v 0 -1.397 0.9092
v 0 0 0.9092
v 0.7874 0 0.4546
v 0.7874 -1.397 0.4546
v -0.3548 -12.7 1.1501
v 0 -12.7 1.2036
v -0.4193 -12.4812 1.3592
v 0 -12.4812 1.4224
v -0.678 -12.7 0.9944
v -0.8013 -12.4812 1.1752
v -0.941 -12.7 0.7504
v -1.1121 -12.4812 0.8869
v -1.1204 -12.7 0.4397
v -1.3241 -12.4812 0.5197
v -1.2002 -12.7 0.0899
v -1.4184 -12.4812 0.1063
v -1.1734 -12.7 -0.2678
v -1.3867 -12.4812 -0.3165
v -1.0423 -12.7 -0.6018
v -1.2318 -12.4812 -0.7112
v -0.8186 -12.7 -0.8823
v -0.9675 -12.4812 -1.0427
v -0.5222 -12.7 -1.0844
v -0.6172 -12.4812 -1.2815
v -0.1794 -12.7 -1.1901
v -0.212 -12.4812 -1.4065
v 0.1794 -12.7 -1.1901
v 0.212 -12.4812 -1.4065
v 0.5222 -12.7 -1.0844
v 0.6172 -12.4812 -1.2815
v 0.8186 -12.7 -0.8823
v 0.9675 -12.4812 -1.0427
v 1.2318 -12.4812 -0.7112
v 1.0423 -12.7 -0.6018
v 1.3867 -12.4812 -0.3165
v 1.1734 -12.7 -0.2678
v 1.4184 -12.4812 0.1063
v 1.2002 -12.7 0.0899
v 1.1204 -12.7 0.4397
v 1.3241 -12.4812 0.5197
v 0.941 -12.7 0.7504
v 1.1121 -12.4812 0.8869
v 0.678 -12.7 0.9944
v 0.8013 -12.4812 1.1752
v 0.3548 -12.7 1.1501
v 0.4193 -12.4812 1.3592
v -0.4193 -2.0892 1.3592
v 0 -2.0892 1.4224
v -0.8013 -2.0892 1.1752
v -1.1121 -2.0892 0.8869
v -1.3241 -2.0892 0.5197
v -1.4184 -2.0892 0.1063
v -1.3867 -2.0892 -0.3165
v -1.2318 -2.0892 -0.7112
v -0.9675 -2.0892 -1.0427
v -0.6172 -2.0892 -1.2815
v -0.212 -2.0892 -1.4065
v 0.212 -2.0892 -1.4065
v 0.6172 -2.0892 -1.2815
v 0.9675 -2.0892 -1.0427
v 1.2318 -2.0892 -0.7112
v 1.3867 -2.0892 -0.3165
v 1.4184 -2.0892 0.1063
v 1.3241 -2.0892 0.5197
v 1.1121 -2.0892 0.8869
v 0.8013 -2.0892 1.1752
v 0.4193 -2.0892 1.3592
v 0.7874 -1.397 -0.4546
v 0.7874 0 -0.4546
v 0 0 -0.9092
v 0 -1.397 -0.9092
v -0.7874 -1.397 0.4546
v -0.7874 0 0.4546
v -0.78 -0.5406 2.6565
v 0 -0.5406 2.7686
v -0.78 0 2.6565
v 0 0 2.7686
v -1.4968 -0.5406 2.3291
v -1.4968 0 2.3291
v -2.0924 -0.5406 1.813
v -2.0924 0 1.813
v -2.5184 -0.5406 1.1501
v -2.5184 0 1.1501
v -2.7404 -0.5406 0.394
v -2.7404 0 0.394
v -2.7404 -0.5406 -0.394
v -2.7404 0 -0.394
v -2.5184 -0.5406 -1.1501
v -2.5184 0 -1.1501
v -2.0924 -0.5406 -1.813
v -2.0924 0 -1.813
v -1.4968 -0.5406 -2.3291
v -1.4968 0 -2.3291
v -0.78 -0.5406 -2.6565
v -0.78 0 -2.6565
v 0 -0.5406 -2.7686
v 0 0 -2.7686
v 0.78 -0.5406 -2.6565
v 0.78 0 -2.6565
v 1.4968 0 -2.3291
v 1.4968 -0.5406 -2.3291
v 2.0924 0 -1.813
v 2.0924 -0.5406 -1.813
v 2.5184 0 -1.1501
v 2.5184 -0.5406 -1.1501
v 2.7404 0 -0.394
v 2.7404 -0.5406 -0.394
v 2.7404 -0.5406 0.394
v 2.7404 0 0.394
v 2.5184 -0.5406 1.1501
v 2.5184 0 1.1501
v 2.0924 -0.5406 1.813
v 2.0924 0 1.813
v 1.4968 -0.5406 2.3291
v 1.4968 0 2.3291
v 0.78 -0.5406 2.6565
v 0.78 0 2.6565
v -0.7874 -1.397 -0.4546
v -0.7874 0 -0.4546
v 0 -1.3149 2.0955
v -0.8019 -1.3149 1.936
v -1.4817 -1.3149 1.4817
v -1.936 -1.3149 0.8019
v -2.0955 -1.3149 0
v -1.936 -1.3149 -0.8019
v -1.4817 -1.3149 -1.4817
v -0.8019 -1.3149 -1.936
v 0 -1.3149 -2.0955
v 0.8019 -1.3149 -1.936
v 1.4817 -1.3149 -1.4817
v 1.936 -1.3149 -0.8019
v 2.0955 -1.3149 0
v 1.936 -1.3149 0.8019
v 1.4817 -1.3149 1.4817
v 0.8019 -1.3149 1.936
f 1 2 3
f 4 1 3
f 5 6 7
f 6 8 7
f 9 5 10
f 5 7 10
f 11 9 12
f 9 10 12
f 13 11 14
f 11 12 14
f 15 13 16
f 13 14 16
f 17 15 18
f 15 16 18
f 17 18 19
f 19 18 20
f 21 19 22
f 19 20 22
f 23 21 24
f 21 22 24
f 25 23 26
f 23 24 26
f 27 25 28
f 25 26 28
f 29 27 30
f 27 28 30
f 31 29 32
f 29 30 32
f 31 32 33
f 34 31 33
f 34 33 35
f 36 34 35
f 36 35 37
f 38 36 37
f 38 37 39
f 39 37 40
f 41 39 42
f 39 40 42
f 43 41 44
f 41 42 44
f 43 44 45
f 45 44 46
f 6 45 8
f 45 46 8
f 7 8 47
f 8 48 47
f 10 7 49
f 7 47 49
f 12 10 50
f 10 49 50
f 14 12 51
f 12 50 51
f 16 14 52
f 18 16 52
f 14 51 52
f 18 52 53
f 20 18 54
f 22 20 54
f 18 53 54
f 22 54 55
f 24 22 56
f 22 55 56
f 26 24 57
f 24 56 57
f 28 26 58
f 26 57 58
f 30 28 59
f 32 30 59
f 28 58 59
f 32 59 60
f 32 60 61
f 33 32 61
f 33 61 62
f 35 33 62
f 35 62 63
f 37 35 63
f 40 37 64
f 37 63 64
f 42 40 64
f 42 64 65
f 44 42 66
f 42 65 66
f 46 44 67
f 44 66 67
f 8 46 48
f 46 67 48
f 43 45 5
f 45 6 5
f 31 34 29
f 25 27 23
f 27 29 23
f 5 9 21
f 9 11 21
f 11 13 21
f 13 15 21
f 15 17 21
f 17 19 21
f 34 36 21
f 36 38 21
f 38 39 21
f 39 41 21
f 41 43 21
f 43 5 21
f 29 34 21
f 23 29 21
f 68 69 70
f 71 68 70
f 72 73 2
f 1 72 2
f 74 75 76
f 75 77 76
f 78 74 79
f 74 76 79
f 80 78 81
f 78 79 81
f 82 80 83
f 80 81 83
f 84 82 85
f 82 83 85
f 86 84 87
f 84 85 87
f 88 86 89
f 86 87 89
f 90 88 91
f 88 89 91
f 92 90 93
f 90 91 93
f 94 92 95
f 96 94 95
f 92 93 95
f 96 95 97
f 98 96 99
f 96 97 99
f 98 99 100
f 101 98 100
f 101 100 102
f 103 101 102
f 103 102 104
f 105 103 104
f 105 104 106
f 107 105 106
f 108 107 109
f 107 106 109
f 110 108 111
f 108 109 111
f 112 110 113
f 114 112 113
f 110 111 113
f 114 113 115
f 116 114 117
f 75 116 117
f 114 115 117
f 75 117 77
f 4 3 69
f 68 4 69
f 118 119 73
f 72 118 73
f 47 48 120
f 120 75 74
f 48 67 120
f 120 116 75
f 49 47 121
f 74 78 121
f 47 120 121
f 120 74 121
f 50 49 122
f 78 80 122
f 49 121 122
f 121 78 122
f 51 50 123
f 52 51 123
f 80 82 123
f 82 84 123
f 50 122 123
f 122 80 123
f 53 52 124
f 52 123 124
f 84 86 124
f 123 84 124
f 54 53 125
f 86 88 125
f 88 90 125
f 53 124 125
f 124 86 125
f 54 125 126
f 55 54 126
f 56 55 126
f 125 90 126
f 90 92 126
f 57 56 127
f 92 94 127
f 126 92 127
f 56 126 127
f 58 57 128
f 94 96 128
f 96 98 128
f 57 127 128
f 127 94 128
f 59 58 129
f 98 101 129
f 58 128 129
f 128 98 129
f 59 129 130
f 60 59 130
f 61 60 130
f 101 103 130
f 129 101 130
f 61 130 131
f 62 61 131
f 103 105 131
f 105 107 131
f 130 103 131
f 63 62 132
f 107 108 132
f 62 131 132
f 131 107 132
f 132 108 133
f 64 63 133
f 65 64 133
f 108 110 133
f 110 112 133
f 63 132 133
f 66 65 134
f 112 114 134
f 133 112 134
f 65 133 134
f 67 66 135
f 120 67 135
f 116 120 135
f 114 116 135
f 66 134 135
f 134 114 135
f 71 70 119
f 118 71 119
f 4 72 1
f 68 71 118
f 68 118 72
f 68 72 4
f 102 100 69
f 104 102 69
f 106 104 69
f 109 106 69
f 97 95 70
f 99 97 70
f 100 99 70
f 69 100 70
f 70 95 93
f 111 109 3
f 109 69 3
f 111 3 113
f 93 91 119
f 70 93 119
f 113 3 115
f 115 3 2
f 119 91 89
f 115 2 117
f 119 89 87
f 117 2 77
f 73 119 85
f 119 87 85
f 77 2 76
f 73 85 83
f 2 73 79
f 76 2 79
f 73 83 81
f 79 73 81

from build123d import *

# Parameters (mm, degrees)
EXTRUDE1_DEPTH = 1.397


with BuildPart() as part:
    # Sketch1 → Revolve1 (revolve)
    with BuildSketch(Plane.XY, mode=Mode.PRIVATE) as revolve1_sk:
        Polygon((0, 0), (0, -12.7), (1.203569231, -12.7), (1.4224, -12.481169231), (1.4224, -2.089184064), (2.7686, -0.540558115), (2.7686, 0), align=None)
    revolve(revolve1_sk.sketch.rotate(Axis((0, 0, 0), (0, -1, 0)), 90), axis=Axis((0, 0, 0), (0, -1, 0)))

    # Sketch2 → Extrude1 (cut)
    with BuildSketch(Plane(origin=(0, 0, 0), x_dir=(1, 0, 0), z_dir=(0, 1, 0))):
        Polygon((0, 0.909211204), (-0.7874, 0.454605602), (-0.7874, -0.454605602), (0, -0.909211204), (0.7874, -0.454605602), (0.7874, 0.454605602), align=None)
    extrude(amount=-EXTRUDE1_DEPTH, mode=Mode.SUBTRACT)


solid = part.part
